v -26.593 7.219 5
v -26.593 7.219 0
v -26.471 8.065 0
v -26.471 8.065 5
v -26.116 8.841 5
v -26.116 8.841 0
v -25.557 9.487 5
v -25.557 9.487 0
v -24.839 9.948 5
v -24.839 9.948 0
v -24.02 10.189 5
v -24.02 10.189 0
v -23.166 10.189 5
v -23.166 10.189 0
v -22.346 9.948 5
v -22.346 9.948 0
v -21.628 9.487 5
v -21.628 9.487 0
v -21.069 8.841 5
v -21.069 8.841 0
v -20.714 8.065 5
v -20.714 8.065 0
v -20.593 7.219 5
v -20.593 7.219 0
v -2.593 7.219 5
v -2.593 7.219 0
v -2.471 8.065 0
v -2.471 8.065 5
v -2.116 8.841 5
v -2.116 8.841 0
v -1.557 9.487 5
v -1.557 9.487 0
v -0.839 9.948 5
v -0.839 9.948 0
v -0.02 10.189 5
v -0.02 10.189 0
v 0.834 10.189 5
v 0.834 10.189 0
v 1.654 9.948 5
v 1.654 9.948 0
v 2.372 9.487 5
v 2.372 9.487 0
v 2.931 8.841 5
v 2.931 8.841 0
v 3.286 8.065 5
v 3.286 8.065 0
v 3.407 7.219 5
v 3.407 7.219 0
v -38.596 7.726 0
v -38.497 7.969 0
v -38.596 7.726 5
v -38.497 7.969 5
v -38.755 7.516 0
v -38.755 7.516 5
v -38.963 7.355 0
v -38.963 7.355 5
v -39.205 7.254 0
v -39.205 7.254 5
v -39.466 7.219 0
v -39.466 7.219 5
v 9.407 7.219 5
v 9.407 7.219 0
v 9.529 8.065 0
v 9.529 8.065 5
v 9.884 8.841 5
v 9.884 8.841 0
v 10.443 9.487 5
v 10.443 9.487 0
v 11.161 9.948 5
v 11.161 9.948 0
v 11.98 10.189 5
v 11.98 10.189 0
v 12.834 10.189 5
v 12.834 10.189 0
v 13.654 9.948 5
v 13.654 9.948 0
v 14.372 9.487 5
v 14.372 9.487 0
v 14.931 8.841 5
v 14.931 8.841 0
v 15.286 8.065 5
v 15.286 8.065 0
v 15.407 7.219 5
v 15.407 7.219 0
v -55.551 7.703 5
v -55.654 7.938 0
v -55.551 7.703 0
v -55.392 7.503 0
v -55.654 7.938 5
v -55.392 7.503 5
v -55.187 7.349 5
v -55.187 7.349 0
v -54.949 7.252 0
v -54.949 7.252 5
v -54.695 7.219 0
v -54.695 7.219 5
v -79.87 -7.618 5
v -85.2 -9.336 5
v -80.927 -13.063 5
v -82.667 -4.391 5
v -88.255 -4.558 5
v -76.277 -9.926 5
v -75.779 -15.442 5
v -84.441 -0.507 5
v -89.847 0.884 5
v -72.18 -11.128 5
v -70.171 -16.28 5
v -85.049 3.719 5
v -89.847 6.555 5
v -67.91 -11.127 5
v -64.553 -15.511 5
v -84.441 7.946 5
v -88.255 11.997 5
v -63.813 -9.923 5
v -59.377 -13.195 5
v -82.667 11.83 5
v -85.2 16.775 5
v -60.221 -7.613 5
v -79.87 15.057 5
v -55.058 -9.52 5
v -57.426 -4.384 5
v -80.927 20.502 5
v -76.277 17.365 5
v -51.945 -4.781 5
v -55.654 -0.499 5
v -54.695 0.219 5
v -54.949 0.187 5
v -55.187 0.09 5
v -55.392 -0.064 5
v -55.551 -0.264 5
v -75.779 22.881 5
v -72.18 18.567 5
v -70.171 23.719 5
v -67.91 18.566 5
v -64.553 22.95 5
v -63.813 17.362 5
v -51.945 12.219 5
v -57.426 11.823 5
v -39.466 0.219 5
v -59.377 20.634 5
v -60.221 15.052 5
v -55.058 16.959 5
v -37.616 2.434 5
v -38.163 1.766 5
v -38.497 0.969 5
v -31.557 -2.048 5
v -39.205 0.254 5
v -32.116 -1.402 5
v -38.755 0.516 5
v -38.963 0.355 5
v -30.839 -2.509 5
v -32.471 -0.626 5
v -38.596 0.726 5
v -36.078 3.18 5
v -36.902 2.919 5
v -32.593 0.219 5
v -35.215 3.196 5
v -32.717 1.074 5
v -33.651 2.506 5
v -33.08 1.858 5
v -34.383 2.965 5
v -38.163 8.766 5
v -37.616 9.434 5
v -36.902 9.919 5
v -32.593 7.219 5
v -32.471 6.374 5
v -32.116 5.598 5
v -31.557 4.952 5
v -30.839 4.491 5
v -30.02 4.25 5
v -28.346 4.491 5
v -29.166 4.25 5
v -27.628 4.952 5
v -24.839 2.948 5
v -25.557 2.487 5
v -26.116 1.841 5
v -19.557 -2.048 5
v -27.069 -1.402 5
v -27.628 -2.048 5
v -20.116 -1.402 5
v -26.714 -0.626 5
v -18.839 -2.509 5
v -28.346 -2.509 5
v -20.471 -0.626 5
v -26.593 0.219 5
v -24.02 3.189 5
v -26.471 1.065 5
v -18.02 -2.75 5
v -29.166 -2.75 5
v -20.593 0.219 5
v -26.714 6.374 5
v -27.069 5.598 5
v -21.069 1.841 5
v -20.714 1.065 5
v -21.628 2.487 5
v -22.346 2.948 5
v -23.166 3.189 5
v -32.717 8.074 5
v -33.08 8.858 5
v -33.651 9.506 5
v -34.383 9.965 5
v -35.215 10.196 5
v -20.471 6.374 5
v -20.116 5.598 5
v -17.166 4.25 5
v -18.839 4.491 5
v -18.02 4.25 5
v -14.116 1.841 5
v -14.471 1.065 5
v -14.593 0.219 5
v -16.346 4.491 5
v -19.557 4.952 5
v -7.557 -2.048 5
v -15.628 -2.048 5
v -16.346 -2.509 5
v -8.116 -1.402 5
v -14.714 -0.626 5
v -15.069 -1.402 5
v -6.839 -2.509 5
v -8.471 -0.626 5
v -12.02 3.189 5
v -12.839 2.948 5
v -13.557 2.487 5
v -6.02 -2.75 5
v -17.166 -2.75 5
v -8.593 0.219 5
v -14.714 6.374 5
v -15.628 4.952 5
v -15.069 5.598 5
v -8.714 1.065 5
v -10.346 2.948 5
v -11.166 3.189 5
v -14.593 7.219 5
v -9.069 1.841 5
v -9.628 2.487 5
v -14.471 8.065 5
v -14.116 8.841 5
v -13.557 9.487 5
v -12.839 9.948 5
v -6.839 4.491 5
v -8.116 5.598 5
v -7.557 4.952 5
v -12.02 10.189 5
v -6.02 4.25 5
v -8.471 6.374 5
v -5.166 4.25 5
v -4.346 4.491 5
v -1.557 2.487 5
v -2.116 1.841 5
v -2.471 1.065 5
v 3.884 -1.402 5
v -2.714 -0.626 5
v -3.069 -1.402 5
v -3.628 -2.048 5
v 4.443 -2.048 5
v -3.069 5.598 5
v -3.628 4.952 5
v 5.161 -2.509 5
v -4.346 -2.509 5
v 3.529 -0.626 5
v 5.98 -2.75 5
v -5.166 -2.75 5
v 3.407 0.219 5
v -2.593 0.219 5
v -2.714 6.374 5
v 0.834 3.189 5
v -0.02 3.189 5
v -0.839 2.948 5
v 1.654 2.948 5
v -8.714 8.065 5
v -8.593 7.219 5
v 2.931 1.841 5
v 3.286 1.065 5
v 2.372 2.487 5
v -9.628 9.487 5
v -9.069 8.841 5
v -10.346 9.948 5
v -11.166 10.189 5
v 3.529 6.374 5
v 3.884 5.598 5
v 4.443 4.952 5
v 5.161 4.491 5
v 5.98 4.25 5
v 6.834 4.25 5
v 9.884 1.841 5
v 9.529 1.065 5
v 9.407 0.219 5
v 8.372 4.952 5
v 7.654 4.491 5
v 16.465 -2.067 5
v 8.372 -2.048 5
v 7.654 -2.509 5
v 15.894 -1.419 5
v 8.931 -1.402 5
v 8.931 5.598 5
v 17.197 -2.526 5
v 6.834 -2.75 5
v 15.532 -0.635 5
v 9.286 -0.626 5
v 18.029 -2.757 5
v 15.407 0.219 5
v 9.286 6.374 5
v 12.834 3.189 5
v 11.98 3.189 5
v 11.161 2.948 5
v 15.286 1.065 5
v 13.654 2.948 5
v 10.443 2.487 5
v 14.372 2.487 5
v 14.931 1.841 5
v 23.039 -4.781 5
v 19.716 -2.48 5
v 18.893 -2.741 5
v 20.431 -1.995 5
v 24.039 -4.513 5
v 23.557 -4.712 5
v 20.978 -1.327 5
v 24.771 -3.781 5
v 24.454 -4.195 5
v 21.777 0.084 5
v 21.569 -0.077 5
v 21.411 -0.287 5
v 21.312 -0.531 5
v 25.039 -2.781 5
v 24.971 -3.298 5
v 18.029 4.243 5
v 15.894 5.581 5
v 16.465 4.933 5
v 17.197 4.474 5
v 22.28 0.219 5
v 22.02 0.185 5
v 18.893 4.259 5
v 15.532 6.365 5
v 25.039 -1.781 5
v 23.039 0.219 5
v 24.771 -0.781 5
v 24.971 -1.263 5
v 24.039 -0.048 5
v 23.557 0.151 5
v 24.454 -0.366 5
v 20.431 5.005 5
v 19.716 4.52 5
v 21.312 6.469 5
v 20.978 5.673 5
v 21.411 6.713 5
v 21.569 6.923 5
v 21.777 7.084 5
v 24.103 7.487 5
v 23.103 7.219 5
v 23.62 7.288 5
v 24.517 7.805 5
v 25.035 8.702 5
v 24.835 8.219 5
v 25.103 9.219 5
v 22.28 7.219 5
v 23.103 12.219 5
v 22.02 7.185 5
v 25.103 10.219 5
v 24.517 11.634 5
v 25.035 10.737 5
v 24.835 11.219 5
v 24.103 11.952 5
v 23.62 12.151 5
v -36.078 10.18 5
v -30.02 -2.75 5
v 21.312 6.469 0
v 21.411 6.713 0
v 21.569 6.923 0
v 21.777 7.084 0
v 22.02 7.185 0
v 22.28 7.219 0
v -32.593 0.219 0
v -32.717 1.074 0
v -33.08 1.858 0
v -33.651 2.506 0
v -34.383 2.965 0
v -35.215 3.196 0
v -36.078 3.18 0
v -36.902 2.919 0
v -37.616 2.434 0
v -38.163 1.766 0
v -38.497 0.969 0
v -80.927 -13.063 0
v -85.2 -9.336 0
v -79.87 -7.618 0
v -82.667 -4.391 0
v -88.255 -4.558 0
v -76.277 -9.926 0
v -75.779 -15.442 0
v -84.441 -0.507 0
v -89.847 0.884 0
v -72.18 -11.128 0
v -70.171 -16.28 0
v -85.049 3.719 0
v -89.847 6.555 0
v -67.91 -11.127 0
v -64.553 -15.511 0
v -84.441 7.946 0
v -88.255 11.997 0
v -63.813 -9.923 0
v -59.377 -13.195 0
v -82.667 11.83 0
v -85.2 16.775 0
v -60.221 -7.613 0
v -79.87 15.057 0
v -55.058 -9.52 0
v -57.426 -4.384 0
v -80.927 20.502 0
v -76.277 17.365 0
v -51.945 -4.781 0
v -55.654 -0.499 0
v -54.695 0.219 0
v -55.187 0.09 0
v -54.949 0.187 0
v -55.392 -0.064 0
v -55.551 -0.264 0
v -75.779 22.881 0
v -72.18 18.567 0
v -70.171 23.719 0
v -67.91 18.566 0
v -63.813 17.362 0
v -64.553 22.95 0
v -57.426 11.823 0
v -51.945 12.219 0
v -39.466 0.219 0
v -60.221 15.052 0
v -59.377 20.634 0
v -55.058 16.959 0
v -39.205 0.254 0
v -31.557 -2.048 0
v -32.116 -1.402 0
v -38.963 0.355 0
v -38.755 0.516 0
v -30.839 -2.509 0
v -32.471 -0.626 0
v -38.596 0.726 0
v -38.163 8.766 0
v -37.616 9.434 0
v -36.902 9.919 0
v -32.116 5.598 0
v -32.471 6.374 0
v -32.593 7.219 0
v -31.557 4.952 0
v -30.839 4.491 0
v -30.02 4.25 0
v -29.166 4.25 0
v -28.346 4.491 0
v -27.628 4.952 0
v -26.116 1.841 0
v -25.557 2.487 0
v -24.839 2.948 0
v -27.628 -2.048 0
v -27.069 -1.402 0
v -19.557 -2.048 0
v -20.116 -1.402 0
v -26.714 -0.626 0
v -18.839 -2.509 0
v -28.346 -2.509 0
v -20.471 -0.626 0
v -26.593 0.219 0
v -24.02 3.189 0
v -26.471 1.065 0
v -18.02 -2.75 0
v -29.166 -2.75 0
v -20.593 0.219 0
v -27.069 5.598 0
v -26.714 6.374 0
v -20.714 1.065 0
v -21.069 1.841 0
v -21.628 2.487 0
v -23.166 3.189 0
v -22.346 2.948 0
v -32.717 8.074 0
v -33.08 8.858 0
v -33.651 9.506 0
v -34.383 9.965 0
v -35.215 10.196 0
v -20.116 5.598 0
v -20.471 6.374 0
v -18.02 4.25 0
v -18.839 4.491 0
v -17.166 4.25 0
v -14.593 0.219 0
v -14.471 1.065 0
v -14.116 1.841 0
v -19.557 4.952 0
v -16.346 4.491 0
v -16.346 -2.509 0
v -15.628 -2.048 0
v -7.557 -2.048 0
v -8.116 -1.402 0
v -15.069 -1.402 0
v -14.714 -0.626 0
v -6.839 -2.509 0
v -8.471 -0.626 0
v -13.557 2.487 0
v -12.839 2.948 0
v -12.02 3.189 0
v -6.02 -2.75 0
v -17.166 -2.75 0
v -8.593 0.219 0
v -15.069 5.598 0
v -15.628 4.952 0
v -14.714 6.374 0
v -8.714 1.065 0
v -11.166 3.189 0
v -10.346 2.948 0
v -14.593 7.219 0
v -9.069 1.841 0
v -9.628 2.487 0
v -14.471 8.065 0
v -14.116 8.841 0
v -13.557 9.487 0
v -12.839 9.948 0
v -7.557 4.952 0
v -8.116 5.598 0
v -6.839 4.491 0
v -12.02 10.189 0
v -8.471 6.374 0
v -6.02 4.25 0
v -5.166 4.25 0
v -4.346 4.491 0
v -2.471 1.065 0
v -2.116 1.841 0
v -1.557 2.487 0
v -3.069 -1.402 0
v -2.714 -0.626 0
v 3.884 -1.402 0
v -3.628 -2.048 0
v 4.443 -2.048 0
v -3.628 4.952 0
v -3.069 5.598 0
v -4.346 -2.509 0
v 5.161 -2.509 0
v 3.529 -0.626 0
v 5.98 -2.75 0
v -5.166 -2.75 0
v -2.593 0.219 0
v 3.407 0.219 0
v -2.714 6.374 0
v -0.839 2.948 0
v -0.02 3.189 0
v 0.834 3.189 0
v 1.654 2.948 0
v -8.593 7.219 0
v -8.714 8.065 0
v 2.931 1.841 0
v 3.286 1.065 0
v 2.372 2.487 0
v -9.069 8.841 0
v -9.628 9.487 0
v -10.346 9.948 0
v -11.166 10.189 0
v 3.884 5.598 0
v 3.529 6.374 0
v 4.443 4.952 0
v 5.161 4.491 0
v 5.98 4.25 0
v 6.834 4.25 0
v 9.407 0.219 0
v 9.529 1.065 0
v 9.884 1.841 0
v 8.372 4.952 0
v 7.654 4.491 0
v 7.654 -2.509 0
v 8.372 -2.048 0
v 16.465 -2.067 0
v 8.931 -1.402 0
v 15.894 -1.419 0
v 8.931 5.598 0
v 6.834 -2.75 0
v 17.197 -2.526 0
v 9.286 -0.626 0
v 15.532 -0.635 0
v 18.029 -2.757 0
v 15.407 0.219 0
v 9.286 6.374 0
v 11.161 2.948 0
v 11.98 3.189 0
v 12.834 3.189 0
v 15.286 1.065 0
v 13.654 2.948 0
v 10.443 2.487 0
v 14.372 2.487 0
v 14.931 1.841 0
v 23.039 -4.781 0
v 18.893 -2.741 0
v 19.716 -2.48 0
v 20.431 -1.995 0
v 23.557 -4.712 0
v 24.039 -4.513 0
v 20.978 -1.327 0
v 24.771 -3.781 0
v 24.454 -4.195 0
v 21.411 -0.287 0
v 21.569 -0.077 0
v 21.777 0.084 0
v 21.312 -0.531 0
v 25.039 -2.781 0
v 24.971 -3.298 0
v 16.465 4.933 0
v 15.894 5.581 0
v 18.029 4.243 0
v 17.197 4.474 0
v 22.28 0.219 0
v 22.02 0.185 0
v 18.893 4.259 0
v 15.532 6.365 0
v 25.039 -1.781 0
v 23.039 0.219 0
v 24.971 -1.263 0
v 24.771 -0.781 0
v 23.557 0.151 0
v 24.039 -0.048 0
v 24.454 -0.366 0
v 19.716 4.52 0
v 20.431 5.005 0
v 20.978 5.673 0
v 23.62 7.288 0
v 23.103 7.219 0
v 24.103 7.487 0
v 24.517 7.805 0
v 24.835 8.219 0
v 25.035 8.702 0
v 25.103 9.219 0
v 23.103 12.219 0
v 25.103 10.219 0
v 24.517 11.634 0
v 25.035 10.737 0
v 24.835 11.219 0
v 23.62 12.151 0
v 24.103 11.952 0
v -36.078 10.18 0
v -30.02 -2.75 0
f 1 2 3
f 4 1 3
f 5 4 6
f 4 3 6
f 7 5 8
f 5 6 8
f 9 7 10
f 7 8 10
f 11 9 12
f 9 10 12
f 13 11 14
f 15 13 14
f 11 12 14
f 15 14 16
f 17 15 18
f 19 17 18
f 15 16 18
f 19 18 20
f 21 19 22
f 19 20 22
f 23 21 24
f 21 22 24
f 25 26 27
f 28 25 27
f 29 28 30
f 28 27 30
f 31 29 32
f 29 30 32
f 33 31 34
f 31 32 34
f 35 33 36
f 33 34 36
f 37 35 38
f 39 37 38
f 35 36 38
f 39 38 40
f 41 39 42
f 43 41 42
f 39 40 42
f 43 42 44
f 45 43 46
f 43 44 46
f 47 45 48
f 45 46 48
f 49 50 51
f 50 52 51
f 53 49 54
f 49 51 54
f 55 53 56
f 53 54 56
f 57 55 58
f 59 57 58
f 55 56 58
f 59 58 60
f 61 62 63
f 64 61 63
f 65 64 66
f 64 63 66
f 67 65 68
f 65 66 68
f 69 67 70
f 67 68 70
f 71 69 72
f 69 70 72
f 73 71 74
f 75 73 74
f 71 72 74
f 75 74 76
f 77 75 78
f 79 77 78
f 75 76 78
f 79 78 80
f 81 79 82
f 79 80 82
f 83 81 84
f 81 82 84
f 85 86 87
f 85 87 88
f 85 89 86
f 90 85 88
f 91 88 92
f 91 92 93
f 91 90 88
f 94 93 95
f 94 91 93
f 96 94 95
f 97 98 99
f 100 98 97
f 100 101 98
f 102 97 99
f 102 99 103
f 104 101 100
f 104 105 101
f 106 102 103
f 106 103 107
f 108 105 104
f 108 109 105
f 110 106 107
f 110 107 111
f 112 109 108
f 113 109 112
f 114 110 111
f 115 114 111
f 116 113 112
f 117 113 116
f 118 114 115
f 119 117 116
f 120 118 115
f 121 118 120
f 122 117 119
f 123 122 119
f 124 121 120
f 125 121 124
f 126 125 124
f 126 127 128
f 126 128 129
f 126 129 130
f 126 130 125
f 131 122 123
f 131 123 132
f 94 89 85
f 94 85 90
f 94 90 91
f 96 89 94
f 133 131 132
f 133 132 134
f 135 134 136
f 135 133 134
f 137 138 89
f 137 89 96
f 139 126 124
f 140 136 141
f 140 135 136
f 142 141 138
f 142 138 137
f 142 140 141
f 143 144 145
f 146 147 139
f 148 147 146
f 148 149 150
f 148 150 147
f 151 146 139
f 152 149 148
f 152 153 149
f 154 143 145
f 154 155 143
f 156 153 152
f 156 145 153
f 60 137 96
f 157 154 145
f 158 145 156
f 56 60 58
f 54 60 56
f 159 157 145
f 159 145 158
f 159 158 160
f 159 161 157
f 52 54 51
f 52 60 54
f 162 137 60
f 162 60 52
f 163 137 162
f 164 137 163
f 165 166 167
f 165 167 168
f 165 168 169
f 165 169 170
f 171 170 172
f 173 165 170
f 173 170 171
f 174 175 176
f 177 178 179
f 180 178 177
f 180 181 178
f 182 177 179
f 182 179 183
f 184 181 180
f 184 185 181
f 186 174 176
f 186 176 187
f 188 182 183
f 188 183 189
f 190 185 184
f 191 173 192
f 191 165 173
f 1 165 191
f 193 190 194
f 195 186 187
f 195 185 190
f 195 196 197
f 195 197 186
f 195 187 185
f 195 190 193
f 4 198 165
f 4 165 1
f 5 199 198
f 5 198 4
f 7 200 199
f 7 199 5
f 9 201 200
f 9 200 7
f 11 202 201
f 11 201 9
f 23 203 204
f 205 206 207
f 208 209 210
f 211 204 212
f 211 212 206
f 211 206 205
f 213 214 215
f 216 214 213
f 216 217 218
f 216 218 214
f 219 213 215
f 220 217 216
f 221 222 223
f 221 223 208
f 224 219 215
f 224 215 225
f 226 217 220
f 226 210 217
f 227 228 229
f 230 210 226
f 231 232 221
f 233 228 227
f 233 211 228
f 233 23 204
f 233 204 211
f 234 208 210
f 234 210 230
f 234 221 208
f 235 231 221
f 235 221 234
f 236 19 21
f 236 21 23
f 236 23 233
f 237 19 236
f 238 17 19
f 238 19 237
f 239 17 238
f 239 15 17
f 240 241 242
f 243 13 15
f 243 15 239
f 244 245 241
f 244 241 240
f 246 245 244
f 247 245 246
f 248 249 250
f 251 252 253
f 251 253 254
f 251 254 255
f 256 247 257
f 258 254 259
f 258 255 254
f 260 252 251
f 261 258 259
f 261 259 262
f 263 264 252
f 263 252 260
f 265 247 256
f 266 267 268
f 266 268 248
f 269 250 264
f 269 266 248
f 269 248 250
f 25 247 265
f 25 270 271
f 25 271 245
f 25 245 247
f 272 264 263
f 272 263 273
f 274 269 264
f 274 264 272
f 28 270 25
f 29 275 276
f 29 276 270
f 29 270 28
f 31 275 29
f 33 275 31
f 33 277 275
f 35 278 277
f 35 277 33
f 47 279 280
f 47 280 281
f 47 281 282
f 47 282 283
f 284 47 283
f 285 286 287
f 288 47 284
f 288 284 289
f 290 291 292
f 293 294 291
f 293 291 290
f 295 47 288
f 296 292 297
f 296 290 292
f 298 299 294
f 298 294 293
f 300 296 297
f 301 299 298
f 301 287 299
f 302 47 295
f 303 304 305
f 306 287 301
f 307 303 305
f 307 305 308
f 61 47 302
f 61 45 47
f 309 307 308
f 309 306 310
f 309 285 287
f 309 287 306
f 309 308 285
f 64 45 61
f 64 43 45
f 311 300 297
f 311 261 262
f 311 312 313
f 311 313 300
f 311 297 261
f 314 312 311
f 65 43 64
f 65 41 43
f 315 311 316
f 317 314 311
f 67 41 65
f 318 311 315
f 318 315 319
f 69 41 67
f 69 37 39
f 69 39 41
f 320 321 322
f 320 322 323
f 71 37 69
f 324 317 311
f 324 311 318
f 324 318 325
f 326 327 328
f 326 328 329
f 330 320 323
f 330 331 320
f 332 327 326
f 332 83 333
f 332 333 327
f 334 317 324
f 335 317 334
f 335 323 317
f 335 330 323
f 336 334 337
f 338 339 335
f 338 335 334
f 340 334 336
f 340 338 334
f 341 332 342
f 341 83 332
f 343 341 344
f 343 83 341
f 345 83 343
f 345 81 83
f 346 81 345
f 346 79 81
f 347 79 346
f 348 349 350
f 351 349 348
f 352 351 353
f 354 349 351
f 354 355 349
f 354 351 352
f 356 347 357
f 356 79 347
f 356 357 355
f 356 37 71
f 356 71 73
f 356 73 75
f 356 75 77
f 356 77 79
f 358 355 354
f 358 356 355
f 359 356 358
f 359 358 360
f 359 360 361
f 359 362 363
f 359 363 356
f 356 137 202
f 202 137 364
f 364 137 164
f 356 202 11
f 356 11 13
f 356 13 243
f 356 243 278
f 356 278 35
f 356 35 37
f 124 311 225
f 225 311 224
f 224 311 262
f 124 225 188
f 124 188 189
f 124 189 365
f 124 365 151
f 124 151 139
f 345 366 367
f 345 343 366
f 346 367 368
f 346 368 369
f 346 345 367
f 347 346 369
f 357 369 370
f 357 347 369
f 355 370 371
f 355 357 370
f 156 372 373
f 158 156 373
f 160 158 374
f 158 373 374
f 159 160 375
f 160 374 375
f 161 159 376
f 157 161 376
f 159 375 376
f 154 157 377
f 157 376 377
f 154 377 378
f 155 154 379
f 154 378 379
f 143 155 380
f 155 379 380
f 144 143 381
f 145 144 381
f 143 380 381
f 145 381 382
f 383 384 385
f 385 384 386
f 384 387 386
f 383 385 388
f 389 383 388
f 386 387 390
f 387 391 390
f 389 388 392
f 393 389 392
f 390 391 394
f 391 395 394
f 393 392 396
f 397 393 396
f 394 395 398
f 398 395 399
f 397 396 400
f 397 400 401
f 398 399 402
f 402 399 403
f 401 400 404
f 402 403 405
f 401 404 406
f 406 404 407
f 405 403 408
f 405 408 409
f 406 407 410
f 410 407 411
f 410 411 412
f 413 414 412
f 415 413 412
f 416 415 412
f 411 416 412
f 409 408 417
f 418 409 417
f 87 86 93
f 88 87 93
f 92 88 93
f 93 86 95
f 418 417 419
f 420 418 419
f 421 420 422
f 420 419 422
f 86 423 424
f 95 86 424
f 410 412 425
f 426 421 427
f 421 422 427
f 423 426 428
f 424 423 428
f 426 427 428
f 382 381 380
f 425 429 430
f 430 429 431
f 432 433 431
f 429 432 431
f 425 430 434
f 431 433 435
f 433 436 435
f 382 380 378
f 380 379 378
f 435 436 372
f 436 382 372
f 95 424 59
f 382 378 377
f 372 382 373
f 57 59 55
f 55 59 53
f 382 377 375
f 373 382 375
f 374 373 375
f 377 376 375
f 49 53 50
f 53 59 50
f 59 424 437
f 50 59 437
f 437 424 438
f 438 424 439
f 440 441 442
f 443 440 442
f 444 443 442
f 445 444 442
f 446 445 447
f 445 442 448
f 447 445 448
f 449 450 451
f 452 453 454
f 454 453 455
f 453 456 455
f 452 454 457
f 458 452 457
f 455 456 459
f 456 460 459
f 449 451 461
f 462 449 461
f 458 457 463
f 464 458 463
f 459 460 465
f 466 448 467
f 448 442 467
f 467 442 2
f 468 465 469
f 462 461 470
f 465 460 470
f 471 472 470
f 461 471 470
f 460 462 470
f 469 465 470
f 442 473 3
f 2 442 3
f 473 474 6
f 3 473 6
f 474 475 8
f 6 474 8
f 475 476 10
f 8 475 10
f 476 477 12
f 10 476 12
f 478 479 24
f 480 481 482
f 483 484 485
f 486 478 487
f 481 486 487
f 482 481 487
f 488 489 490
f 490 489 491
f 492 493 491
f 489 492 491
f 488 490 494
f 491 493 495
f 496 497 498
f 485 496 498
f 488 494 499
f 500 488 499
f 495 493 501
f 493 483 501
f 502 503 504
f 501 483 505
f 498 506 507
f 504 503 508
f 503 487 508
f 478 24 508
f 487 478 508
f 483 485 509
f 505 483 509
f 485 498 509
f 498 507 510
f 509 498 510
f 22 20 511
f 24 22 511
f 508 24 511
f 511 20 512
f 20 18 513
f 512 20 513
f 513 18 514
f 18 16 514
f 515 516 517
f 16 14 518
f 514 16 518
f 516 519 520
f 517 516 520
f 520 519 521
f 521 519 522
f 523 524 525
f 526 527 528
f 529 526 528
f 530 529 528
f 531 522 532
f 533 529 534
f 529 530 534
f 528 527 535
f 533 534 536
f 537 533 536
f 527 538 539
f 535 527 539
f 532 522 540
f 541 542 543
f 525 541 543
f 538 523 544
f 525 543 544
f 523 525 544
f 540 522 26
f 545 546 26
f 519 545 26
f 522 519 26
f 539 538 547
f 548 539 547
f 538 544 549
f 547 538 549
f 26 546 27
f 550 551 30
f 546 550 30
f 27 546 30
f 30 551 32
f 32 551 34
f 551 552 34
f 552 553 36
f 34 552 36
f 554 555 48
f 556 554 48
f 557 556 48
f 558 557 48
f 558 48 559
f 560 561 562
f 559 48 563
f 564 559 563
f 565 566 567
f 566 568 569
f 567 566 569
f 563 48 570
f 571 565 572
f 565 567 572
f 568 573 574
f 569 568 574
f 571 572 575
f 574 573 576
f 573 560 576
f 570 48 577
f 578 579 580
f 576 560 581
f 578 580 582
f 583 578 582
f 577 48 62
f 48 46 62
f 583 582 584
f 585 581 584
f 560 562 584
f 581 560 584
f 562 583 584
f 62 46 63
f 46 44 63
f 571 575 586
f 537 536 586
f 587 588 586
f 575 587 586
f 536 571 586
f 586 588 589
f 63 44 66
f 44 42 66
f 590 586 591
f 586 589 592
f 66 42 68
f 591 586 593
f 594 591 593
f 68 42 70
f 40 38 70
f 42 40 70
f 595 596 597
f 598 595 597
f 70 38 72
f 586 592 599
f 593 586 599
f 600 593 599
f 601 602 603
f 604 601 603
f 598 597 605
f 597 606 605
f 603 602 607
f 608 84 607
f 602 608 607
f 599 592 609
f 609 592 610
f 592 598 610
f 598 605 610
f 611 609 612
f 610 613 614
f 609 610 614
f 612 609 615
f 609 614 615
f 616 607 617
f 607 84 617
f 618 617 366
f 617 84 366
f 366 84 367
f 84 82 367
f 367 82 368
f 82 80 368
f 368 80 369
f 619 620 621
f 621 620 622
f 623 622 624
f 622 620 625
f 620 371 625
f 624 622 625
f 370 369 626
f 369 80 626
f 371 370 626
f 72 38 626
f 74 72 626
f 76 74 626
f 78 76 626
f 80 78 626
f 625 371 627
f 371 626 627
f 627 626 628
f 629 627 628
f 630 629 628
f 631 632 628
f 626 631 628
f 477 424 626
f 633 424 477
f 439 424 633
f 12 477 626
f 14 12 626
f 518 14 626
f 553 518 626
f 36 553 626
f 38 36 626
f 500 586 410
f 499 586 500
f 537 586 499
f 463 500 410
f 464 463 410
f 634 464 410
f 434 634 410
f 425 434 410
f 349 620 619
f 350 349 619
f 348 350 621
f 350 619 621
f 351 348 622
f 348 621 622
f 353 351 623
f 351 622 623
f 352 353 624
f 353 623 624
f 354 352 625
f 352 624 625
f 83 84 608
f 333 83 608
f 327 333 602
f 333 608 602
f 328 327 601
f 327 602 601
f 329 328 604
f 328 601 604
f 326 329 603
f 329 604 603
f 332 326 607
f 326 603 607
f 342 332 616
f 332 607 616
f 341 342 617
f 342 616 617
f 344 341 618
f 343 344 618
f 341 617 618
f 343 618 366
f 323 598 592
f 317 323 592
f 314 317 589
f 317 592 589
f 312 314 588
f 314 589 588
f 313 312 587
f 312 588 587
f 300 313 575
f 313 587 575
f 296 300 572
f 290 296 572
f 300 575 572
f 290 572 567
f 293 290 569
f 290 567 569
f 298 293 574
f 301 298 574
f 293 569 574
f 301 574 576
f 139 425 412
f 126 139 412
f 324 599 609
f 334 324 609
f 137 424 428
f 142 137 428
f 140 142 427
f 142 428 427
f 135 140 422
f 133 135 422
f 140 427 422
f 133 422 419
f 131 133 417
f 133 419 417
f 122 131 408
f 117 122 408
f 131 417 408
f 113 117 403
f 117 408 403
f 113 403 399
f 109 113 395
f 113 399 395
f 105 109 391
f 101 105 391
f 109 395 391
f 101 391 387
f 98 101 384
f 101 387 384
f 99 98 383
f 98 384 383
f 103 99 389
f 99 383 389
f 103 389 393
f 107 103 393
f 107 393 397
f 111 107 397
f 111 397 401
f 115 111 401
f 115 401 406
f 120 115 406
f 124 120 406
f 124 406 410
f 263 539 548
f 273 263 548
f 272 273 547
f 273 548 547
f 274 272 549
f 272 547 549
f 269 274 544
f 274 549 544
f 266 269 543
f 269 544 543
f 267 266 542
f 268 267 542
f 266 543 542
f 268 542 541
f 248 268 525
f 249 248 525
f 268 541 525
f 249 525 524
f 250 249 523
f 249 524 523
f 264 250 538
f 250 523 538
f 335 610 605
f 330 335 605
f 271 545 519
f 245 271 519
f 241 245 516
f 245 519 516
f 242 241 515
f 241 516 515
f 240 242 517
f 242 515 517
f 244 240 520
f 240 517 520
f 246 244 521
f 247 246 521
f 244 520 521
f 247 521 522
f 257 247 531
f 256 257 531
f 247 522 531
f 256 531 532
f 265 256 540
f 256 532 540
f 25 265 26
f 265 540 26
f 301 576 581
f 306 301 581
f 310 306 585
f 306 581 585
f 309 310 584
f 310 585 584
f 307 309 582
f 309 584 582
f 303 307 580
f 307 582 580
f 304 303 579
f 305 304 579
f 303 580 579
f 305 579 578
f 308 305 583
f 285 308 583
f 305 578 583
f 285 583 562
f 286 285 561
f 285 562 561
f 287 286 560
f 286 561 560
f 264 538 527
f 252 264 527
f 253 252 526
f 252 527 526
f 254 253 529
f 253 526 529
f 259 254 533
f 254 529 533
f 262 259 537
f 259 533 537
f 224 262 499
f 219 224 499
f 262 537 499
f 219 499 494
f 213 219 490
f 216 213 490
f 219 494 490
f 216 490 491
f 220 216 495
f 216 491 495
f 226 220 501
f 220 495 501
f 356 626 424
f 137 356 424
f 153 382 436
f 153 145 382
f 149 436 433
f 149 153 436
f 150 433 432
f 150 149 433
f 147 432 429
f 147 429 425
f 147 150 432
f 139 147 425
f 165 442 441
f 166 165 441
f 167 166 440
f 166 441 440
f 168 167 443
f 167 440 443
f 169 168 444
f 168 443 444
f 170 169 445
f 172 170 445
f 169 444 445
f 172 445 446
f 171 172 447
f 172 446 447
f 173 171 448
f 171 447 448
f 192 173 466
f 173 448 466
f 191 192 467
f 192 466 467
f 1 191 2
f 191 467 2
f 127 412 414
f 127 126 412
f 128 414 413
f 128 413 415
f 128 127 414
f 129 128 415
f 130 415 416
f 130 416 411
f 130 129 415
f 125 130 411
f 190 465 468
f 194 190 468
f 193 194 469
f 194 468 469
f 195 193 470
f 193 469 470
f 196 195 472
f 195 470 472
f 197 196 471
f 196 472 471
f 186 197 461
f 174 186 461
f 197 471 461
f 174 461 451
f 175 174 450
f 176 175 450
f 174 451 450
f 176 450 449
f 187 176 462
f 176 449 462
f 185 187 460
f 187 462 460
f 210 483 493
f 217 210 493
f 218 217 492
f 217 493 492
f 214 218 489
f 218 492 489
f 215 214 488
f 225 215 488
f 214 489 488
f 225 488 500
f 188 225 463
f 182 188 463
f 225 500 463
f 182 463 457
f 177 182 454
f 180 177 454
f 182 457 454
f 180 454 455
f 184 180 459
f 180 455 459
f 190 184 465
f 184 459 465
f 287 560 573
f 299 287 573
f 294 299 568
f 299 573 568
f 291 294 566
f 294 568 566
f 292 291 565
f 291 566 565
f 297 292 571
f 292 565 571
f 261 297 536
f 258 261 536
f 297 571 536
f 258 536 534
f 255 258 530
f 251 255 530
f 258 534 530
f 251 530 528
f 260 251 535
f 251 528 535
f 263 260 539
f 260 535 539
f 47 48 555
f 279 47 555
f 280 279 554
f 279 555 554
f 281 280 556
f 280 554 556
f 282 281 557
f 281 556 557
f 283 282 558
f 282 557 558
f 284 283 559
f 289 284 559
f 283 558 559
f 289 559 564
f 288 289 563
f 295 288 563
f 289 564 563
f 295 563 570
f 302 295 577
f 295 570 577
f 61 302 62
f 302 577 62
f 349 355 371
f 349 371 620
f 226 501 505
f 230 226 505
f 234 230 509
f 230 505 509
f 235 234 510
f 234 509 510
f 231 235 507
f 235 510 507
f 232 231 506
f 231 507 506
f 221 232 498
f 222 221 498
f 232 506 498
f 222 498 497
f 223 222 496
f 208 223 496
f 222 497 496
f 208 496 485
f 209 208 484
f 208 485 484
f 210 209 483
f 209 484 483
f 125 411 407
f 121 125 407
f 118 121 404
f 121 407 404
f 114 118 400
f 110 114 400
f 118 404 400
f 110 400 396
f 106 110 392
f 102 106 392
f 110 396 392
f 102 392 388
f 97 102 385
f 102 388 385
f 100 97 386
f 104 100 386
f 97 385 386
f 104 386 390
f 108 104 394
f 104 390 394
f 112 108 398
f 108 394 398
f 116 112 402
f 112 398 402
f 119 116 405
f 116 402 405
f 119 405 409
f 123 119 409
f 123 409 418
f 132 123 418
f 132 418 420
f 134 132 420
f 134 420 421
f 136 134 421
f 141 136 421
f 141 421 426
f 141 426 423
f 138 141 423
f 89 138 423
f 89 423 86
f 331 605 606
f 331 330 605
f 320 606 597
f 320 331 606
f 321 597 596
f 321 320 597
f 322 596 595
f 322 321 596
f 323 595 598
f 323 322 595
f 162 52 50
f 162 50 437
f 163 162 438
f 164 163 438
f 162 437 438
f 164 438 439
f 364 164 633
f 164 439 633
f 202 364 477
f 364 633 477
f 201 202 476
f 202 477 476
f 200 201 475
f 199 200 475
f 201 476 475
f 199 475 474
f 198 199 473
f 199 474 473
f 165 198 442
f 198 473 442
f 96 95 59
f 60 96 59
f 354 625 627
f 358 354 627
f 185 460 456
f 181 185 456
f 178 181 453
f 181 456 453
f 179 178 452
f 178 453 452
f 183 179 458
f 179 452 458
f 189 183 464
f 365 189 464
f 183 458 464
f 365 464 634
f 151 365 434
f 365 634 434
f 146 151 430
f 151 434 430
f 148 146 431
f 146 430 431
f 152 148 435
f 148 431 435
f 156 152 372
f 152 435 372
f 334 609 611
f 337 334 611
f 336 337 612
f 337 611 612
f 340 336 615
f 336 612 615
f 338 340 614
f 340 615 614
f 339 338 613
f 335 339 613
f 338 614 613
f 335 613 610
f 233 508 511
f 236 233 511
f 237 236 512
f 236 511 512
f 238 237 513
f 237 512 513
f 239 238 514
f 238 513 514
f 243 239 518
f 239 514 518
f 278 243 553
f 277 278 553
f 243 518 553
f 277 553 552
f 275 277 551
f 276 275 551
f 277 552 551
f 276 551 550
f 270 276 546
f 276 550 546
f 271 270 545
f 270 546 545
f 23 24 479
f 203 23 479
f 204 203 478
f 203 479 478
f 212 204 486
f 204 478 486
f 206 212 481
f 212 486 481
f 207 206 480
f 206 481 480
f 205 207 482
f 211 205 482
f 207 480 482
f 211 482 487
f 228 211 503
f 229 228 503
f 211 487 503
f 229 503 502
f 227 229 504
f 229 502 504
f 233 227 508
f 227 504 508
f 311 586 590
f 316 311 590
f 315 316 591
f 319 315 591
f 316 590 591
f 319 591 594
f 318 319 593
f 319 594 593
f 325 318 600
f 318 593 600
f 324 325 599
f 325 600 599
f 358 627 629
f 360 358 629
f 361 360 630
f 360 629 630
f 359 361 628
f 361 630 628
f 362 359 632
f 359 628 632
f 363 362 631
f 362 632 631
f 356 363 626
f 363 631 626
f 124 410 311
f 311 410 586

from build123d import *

# Parameters (mm, degrees)
F1_DEPTH = 5
F2_R     = 1


with BuildPart() as f1:
    # F0 (on Top) → F1 (new body)
    with BuildSketch(Plane.XY):
        with BuildLine():
            ThreePointArc((-38.5927113062, 7.2194887325), (-35.5927113062, 10.2194887325), (-32.5927113062, 7.2194887325))
            ThreePointArc((-32.5927113062, 7.2194887325), (-29.5927113062, 4.2194887325), (-26.5927113062, 7.2194887325))
            ThreePointArc((-26.5927113062, 7.2194887325), (-23.5927113062, 10.2194887325), (-20.5927113062, 7.2194887325))
            ThreePointArc((-20.5927113062, 7.2194887325), (-17.5927113062, 4.2194887325), (-14.5927113062, 7.2194887325))
            ThreePointArc((-14.5927113062, 7.2194887325), (-11.5927113062, 10.2194887325), (-8.5927113062, 7.2194887325))
            ThreePointArc((-8.5927113062, 7.2194887325), (-5.5927113062, 4.2194887325), (-2.5927113062, 7.2194887325))
            ThreePointArc((-2.5927113062, 7.2194887325), (0.4072886938, 10.2194887325), (3.4072886938, 7.2194887325))
            ThreePointArc((3.4072886938, 7.2194887325), (6.4072886938, 4.2194887325), (9.4072886938, 7.2194887325))
            ThreePointArc((9.4072886938, 7.2194887325), (12.4072886938, 10.2194887325), (15.4072886938, 7.2194887325))
            ThreePointArc((15.4072886938, 7.2194887325), (18.4072886938, 4.2194887325), (21.4072886938, 7.2194887325))
            Line((21.4072886938, 7.2194887325), (23.1027154343, 7.2194887325))
            ThreePointArc((23.1027154343, 7.2194887325), (24.5169289967, 7.8052751701), (25.1027154343, 9.2194887325))
            Line((25.1027154343, 9.2194887325), (25.1027154343, 10.2194887325))
            ThreePointArc((25.1027154343, 10.2194887325), (24.5169289967, 11.6337022949), (23.1027154343, 12.2194887325))
            Line((23.1027154343, 12.2194887325), (-51.9450229577, 12.2194887325))
            ThreePointArc((-51.9450229577, 12.2194887325), (-90.0488899479, 3.7194887325), (-51.9450229577, -4.7805112675))
            Line((-51.9450229577, -4.7805112675), (23.0392886417, -4.7805112675))
            ThreePointArc((23.0392886417, -4.7805112675), (24.4535022041, -4.1947248299), (25.0392886417, -2.7805112675))
            Line((25.0392886417, -2.7805112675), (25.0392886417, -1.7805112675))
            ThreePointArc((25.0392886417, -1.7805112675), (24.4535022041, -0.3662977051), (23.0392886417, 0.2194887325))
            Line((23.0392886417, 0.2194887325), (21.4072886938, 0.2194887325))
            ThreePointArc((21.4072886938, 0.2194887325), (18.4072886938, -2.7805112675), (15.4072886938, 0.2194887325))
            ThreePointArc((15.4072886938, 0.2194887325), (12.4072886938, 3.2194887325), (9.4072886938, 0.2194887325))
            ThreePointArc((9.4072886938, 0.2194887325), (6.4072886938, -2.7805112675), (3.4072886938, 0.2194887325))
            ThreePointArc((3.4072886938, 0.2194887325), (0.4072886938, 3.2194887325), (-2.5927113062, 0.2194887325))
            ThreePointArc((-2.5927113062, 0.2194887325), (-5.5927113062, -2.7805112675), (-8.5927113062, 0.2194887325))
            ThreePointArc((-8.5927113062, 0.2194887325), (-11.5927113062, 3.2194887325), (-14.5927113062, 0.2194887325))
            ThreePointArc((-14.5927113062, 0.2194887325), (-17.5927113062, -2.7805112675), (-20.5927113062, 0.2194887325))
            ThreePointArc((-20.5927113062, 0.2194887325), (-23.5927113062, 3.2194887325), (-26.5927113062, 0.2194887325))
            ThreePointArc((-26.5927113062, 0.2194887325), (-29.5927113062, -2.7805112675), (-32.5927113062, 0.2194887325))
            ThreePointArc((-32.5927113062, 0.2194887325), (-35.5927113062, 3.2194887325), (-38.5927113062, 0.2194887325))
            Line((-38.5927113062, 0.2194887325), (-55.4629378021, 0.2194887325))
            ThreePointArc((-55.4629378021, 0.2194887325), (-85.0488899479, 3.7194887325), (-55.4629378021, 7.2194887325))
            Line((-55.4629378021, 7.2194887325), (-38.5927113062, 7.2194887325))
        make_face()
    extrude(amount=F1_DEPTH)

    # F2
    f2_edges = [f1.edges().sort_by_distance(p)[0] for p in [
        (-55.462938, 7.219489, 2.5),
        (-38.592711, 7.219489, 2.5),
        (-38.592711, 0.219489, 2.5),
        (-55.462938, 0.219489, 2.5),
        (21.407289, 0.219489, 2.5),
        (21.407289, 7.219489, 2.5),
    ]]
    fillet(f2_edges, radius=F2_R)


solid = f1.part
